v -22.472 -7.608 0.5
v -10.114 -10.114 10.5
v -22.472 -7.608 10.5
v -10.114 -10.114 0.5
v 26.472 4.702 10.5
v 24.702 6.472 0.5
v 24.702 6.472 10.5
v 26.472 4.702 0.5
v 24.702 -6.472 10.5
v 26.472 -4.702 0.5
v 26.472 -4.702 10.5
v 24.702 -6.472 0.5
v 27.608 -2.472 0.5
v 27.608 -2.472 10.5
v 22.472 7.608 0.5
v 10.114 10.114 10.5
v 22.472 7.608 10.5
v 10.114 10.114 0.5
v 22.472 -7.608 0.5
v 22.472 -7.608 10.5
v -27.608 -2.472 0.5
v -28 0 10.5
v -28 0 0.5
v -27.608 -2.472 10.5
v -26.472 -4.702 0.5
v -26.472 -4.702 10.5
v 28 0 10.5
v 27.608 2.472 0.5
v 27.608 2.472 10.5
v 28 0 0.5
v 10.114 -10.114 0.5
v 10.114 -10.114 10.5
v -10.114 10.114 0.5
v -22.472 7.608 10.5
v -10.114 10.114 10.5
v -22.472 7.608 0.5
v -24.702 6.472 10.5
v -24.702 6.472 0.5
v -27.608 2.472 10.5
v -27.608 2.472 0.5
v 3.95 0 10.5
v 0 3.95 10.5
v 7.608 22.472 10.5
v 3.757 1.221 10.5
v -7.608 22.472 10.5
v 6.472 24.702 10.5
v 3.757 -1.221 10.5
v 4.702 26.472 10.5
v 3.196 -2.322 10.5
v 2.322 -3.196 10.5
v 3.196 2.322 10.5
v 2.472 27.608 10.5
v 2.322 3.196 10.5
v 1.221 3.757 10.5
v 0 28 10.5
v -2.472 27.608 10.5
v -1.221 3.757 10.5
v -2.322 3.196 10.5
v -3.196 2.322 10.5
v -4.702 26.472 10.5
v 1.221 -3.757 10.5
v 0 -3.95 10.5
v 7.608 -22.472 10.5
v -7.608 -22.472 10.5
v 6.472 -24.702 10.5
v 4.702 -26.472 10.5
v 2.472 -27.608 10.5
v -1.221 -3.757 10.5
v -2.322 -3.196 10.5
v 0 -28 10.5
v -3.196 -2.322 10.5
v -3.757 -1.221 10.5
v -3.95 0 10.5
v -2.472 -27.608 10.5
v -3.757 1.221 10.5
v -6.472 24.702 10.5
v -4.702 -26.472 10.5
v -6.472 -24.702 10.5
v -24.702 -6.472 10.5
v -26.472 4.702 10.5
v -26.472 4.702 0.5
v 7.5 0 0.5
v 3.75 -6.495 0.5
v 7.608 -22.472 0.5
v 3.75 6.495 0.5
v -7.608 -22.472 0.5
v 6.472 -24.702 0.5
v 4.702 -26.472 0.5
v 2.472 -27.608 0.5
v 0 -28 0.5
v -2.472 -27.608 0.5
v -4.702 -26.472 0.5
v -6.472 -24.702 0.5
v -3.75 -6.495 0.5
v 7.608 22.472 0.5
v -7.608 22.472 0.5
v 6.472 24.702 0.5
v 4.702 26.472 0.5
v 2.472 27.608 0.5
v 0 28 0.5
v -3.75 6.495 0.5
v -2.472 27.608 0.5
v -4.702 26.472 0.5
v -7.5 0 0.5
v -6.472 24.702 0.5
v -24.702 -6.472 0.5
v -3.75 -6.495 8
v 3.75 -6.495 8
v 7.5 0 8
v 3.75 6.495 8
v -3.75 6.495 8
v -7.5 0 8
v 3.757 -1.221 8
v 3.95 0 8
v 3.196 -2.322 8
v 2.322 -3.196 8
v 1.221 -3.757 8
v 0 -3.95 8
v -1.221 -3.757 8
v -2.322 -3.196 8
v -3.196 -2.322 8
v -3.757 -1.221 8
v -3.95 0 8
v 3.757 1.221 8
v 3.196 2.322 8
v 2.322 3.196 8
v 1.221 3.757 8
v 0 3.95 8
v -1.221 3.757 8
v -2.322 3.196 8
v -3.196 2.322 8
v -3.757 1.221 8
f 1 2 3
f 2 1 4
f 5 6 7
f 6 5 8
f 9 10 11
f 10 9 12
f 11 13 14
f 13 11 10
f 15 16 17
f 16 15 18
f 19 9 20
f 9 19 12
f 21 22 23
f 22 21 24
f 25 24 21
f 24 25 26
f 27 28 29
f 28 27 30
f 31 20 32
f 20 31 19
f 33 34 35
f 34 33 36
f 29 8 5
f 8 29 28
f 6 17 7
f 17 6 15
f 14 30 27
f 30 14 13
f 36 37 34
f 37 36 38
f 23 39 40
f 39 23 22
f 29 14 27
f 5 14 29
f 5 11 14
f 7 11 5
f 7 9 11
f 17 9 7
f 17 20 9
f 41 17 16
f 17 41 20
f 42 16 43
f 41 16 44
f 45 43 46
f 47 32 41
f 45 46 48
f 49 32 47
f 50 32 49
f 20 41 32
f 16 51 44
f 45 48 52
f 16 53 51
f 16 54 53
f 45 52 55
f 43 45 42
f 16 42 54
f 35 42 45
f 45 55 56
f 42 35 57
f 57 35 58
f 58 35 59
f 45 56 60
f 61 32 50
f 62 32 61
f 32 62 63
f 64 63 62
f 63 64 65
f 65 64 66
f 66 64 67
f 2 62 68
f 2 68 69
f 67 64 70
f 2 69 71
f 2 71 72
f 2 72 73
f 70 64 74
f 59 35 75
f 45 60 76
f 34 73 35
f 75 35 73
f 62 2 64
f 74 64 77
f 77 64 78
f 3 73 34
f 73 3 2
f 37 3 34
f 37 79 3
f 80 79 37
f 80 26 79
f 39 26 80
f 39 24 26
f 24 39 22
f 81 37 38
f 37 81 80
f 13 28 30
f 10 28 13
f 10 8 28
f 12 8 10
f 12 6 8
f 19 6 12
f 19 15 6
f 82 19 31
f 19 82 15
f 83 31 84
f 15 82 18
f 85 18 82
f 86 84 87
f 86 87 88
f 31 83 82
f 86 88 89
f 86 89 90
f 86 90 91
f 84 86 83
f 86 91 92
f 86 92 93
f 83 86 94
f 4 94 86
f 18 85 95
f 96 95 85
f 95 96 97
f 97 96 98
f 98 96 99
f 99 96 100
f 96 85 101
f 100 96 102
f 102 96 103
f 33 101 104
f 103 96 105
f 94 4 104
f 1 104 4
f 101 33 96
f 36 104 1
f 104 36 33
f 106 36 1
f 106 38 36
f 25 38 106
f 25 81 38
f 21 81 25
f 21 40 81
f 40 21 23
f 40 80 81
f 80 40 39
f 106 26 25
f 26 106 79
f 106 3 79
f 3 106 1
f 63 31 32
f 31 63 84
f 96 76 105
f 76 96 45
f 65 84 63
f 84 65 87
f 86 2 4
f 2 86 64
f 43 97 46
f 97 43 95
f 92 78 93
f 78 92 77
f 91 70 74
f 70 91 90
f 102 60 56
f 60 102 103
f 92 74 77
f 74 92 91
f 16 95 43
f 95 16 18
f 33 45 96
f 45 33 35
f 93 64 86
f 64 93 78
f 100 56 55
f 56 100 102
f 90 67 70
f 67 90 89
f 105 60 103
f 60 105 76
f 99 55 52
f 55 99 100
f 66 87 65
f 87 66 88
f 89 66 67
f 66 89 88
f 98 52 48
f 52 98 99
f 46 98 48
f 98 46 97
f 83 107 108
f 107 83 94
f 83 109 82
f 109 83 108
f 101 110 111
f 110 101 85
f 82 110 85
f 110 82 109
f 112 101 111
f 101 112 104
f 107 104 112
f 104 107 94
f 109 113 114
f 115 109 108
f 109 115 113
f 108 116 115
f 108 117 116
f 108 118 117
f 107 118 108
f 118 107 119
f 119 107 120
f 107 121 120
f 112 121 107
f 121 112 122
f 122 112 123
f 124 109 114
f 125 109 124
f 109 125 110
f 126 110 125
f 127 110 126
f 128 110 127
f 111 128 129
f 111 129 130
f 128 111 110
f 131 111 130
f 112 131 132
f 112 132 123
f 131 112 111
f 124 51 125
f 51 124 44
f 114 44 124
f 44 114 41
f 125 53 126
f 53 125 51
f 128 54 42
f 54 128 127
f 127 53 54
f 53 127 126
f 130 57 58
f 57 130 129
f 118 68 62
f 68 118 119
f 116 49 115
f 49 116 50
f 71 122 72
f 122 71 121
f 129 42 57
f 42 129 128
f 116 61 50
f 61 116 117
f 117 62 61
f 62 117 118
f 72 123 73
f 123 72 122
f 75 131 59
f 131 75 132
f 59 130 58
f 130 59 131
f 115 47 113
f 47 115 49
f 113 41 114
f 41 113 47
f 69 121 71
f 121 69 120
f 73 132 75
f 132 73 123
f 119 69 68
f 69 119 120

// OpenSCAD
head_width = 15/2;
bolt_r=7.9/2;
x=80;
y=30;
z=10;

/*
difference(){
	translate([0,0,z/2+1])cube([x,y,z],center=true);
	translate([-25,0,0])head();
	translate([25,0,0])head();
}
*/

difference(){
translate([0,0,0.5])handle();
head();
}
module handle(){
	h=10;
	hull(){
		for(r=[0,180]){
			rotate([0,0,r])translate([20,0,0])cylinder(r=8,h=h,$fn=20);
		}
		cylinder(r=12,h=h,$fn=20);
	}
	hull(){
		for(r=[90,270]){
			rotate([0,0,r])translate([20,0,0])cylinder(r=8,h=h,$fn=20);
		}
		cylinder(r=12,h=h,$fn=20);
	}
}

module head(){
	cylinder(r=head_width,h=8,$fn=6);
	cylinder(r=bolt_r,h=20,$fn=20);
	//color([1,0,0])cube([12.8,12.8,12.8],center=true);
}
